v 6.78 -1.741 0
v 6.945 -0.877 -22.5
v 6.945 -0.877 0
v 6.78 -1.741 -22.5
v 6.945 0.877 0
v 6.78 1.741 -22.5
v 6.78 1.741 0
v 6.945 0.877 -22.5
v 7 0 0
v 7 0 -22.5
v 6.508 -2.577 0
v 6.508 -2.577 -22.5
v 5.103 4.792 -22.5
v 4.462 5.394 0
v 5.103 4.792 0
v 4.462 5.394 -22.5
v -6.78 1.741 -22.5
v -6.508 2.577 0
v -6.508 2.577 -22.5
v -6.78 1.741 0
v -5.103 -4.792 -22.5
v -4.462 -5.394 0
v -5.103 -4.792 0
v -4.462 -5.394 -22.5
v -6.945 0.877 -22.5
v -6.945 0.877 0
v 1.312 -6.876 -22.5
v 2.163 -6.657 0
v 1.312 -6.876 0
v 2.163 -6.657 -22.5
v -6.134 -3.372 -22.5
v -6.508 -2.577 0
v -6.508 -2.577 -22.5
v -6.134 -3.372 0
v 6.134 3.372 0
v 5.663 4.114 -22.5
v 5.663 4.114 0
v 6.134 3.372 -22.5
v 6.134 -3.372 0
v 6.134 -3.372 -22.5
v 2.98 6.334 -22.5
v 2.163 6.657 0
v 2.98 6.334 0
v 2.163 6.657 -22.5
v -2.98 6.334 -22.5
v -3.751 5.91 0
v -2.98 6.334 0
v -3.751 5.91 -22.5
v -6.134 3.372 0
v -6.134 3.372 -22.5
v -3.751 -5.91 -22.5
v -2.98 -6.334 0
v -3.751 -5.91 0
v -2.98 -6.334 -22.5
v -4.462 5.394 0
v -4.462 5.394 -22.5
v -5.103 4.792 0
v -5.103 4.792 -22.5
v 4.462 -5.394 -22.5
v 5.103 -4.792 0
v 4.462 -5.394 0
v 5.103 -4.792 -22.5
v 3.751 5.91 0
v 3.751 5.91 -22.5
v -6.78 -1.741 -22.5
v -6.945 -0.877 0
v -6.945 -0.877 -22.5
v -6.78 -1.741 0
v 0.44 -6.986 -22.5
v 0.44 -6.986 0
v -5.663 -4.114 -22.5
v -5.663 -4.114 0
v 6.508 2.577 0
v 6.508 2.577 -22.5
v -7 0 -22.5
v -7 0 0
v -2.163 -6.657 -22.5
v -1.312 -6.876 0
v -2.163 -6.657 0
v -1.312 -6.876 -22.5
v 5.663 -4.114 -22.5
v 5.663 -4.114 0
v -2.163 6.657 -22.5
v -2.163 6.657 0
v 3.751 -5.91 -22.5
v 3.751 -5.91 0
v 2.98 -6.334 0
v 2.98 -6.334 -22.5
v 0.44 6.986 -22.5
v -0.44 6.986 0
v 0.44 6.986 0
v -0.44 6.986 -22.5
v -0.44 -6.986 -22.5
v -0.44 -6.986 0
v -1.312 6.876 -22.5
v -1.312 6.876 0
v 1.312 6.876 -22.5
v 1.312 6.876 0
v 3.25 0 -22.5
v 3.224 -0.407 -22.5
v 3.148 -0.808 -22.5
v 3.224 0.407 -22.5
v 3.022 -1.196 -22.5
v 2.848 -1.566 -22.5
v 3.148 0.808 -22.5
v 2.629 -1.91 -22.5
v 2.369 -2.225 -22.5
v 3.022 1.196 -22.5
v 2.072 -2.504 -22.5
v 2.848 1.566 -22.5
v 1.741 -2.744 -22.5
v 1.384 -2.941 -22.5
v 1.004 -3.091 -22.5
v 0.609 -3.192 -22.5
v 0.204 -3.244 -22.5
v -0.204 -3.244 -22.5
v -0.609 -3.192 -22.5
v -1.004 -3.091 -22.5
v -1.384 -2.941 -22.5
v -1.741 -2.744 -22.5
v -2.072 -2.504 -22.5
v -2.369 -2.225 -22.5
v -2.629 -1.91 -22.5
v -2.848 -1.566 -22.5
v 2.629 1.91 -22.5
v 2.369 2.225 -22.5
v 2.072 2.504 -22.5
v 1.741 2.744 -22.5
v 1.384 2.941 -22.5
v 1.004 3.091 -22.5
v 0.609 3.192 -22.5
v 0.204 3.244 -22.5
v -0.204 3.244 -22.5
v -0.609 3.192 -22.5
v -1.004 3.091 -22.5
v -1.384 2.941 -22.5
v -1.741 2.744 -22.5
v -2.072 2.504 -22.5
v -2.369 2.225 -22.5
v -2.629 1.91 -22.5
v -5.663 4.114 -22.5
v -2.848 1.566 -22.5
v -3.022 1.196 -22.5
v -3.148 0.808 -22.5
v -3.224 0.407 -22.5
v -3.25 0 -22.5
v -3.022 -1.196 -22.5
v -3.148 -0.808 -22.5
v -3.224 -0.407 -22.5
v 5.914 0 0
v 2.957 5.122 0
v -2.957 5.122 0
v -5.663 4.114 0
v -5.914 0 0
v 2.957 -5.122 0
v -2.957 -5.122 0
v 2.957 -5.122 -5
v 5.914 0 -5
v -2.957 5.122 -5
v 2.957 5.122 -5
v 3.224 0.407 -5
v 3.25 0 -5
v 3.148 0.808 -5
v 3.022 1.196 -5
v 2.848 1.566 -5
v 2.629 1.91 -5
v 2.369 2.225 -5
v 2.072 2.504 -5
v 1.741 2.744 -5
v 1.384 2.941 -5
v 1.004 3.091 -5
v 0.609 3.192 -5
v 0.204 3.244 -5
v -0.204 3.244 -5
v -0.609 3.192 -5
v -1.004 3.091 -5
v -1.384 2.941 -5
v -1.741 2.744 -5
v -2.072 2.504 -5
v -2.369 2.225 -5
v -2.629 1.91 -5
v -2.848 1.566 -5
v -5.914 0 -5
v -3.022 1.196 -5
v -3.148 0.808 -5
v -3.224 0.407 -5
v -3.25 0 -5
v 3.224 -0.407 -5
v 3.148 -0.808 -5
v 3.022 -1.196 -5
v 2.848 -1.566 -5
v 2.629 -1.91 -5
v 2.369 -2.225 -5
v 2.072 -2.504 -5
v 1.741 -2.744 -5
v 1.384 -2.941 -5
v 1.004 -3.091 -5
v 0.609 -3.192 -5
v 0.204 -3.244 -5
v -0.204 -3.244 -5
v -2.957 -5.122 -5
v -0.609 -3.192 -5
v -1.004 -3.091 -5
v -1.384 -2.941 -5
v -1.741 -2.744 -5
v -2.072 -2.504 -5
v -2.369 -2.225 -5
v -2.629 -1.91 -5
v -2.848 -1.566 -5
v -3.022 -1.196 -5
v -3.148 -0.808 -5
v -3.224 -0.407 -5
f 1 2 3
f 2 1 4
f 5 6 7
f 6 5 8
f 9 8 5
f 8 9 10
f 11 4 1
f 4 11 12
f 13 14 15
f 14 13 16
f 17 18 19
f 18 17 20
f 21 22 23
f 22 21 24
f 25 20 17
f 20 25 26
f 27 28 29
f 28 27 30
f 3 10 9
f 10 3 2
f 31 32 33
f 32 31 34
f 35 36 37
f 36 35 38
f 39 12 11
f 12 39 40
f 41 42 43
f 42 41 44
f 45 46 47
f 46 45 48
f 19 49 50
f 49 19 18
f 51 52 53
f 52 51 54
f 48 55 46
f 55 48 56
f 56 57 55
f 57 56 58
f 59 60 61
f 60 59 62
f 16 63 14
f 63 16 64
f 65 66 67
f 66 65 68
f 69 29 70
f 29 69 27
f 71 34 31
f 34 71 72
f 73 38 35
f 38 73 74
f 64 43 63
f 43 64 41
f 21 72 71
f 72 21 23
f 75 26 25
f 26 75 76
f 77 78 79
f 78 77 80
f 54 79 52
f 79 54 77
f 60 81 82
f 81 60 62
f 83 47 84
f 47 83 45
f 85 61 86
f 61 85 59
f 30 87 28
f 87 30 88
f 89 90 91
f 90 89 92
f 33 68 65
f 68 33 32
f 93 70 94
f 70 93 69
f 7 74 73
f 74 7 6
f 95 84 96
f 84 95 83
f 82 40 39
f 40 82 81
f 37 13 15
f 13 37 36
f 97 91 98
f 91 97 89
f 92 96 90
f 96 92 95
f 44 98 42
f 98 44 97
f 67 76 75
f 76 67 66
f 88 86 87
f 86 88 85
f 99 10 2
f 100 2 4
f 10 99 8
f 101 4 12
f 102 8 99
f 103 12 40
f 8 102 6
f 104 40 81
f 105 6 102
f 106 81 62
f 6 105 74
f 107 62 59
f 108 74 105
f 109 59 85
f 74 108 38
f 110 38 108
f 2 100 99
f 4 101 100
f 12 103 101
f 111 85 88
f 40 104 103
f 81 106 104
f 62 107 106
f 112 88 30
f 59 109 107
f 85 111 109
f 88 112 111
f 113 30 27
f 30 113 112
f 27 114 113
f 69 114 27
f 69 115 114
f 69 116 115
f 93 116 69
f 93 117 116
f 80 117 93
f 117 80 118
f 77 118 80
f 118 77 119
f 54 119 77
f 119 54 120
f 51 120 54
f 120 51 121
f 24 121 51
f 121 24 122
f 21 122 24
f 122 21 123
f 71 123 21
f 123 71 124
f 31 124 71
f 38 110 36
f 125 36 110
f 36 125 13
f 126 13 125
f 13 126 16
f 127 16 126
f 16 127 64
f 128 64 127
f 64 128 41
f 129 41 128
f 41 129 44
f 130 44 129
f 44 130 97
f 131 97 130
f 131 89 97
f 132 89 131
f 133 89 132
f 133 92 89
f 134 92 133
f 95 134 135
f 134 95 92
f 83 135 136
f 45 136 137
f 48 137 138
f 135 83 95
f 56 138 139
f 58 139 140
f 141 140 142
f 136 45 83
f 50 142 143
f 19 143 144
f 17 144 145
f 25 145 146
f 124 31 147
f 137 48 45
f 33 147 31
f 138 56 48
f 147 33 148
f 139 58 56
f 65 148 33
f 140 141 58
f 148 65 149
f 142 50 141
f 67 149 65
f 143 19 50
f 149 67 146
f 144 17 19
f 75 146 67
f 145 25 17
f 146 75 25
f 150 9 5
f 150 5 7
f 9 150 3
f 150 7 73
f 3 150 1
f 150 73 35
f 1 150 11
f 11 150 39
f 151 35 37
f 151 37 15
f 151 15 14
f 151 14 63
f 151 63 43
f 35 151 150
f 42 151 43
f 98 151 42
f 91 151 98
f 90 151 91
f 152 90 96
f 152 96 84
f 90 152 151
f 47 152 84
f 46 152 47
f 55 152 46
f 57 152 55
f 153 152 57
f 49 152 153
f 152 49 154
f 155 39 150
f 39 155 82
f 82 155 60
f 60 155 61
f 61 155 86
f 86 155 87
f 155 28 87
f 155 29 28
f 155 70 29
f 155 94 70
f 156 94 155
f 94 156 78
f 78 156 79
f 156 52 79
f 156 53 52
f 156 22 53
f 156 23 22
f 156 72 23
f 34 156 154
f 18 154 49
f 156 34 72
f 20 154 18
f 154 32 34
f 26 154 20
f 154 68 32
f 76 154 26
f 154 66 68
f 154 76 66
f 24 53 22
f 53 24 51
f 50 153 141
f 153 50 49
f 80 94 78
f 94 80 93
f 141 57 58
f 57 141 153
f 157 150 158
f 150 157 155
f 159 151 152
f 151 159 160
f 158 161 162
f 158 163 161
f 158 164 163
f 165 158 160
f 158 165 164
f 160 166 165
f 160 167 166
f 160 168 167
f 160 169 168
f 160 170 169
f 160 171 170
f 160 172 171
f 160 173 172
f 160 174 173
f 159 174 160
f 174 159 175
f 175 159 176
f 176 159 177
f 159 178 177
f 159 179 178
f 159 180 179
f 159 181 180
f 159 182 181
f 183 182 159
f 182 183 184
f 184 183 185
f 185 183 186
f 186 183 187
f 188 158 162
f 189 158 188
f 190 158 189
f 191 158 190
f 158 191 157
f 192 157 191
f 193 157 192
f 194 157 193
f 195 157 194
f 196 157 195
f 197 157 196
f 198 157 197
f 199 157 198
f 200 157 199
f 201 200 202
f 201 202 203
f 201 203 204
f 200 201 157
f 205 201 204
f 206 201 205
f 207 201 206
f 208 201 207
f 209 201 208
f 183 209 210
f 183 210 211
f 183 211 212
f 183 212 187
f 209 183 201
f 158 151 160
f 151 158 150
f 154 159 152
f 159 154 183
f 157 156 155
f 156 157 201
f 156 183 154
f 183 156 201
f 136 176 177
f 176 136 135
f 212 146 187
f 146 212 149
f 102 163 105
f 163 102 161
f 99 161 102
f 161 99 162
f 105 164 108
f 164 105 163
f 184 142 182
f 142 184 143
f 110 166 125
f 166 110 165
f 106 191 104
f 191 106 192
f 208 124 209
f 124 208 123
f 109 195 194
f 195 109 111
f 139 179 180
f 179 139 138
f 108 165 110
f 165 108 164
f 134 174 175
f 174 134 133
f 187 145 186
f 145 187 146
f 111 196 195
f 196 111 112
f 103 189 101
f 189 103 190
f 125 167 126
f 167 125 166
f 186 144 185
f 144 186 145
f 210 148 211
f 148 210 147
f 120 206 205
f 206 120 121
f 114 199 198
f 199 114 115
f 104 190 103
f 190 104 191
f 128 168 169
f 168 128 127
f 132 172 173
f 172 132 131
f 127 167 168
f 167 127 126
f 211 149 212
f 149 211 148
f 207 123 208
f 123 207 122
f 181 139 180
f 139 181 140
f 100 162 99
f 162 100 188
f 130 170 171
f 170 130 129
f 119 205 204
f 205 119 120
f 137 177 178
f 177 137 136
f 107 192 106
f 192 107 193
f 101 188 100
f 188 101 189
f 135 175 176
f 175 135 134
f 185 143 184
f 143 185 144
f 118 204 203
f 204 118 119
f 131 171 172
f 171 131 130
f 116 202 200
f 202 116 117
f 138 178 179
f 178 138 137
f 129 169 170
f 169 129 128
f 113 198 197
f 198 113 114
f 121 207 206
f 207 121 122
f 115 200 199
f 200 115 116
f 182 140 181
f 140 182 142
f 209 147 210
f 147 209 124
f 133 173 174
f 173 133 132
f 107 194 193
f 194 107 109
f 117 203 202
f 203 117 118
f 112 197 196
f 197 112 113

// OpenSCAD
$fn = 50;

difference() {
	union() {
		translate(v = [0, 0, -22.5]) {
			cylinder(h = 22.5, r = 7.0);
		}
		#translate(v = [0, 0, -24.0]) {
			cylinder(h = 24, r = 2.875);
		}
	}
	union() {
		translate(v = [0, 0, 0]) {
			rotate(a = [0, 0, 0]) {
				difference() {
					union() {
						translate(v = [0, 0, -5]) {
							linear_extrude(height = 5) {
								polygon(points = [[5.914249999999999, 0.0], [2.957125, 5.1218907443321156], [-2.9571249999999982, 5.1218907443321156], [-5.914249999999999, 7.242867331857232e-16], [-2.9571250000000022, -5.121890744332115], [2.9571249999999956, -5.121890744332118]]);
							}
						}
					}
					union();
				}
			}
		}
		#translate(v = [0, 0, -100.0]) {
			cylinder(h = 200, r = 3.25);
		}
	}
}
